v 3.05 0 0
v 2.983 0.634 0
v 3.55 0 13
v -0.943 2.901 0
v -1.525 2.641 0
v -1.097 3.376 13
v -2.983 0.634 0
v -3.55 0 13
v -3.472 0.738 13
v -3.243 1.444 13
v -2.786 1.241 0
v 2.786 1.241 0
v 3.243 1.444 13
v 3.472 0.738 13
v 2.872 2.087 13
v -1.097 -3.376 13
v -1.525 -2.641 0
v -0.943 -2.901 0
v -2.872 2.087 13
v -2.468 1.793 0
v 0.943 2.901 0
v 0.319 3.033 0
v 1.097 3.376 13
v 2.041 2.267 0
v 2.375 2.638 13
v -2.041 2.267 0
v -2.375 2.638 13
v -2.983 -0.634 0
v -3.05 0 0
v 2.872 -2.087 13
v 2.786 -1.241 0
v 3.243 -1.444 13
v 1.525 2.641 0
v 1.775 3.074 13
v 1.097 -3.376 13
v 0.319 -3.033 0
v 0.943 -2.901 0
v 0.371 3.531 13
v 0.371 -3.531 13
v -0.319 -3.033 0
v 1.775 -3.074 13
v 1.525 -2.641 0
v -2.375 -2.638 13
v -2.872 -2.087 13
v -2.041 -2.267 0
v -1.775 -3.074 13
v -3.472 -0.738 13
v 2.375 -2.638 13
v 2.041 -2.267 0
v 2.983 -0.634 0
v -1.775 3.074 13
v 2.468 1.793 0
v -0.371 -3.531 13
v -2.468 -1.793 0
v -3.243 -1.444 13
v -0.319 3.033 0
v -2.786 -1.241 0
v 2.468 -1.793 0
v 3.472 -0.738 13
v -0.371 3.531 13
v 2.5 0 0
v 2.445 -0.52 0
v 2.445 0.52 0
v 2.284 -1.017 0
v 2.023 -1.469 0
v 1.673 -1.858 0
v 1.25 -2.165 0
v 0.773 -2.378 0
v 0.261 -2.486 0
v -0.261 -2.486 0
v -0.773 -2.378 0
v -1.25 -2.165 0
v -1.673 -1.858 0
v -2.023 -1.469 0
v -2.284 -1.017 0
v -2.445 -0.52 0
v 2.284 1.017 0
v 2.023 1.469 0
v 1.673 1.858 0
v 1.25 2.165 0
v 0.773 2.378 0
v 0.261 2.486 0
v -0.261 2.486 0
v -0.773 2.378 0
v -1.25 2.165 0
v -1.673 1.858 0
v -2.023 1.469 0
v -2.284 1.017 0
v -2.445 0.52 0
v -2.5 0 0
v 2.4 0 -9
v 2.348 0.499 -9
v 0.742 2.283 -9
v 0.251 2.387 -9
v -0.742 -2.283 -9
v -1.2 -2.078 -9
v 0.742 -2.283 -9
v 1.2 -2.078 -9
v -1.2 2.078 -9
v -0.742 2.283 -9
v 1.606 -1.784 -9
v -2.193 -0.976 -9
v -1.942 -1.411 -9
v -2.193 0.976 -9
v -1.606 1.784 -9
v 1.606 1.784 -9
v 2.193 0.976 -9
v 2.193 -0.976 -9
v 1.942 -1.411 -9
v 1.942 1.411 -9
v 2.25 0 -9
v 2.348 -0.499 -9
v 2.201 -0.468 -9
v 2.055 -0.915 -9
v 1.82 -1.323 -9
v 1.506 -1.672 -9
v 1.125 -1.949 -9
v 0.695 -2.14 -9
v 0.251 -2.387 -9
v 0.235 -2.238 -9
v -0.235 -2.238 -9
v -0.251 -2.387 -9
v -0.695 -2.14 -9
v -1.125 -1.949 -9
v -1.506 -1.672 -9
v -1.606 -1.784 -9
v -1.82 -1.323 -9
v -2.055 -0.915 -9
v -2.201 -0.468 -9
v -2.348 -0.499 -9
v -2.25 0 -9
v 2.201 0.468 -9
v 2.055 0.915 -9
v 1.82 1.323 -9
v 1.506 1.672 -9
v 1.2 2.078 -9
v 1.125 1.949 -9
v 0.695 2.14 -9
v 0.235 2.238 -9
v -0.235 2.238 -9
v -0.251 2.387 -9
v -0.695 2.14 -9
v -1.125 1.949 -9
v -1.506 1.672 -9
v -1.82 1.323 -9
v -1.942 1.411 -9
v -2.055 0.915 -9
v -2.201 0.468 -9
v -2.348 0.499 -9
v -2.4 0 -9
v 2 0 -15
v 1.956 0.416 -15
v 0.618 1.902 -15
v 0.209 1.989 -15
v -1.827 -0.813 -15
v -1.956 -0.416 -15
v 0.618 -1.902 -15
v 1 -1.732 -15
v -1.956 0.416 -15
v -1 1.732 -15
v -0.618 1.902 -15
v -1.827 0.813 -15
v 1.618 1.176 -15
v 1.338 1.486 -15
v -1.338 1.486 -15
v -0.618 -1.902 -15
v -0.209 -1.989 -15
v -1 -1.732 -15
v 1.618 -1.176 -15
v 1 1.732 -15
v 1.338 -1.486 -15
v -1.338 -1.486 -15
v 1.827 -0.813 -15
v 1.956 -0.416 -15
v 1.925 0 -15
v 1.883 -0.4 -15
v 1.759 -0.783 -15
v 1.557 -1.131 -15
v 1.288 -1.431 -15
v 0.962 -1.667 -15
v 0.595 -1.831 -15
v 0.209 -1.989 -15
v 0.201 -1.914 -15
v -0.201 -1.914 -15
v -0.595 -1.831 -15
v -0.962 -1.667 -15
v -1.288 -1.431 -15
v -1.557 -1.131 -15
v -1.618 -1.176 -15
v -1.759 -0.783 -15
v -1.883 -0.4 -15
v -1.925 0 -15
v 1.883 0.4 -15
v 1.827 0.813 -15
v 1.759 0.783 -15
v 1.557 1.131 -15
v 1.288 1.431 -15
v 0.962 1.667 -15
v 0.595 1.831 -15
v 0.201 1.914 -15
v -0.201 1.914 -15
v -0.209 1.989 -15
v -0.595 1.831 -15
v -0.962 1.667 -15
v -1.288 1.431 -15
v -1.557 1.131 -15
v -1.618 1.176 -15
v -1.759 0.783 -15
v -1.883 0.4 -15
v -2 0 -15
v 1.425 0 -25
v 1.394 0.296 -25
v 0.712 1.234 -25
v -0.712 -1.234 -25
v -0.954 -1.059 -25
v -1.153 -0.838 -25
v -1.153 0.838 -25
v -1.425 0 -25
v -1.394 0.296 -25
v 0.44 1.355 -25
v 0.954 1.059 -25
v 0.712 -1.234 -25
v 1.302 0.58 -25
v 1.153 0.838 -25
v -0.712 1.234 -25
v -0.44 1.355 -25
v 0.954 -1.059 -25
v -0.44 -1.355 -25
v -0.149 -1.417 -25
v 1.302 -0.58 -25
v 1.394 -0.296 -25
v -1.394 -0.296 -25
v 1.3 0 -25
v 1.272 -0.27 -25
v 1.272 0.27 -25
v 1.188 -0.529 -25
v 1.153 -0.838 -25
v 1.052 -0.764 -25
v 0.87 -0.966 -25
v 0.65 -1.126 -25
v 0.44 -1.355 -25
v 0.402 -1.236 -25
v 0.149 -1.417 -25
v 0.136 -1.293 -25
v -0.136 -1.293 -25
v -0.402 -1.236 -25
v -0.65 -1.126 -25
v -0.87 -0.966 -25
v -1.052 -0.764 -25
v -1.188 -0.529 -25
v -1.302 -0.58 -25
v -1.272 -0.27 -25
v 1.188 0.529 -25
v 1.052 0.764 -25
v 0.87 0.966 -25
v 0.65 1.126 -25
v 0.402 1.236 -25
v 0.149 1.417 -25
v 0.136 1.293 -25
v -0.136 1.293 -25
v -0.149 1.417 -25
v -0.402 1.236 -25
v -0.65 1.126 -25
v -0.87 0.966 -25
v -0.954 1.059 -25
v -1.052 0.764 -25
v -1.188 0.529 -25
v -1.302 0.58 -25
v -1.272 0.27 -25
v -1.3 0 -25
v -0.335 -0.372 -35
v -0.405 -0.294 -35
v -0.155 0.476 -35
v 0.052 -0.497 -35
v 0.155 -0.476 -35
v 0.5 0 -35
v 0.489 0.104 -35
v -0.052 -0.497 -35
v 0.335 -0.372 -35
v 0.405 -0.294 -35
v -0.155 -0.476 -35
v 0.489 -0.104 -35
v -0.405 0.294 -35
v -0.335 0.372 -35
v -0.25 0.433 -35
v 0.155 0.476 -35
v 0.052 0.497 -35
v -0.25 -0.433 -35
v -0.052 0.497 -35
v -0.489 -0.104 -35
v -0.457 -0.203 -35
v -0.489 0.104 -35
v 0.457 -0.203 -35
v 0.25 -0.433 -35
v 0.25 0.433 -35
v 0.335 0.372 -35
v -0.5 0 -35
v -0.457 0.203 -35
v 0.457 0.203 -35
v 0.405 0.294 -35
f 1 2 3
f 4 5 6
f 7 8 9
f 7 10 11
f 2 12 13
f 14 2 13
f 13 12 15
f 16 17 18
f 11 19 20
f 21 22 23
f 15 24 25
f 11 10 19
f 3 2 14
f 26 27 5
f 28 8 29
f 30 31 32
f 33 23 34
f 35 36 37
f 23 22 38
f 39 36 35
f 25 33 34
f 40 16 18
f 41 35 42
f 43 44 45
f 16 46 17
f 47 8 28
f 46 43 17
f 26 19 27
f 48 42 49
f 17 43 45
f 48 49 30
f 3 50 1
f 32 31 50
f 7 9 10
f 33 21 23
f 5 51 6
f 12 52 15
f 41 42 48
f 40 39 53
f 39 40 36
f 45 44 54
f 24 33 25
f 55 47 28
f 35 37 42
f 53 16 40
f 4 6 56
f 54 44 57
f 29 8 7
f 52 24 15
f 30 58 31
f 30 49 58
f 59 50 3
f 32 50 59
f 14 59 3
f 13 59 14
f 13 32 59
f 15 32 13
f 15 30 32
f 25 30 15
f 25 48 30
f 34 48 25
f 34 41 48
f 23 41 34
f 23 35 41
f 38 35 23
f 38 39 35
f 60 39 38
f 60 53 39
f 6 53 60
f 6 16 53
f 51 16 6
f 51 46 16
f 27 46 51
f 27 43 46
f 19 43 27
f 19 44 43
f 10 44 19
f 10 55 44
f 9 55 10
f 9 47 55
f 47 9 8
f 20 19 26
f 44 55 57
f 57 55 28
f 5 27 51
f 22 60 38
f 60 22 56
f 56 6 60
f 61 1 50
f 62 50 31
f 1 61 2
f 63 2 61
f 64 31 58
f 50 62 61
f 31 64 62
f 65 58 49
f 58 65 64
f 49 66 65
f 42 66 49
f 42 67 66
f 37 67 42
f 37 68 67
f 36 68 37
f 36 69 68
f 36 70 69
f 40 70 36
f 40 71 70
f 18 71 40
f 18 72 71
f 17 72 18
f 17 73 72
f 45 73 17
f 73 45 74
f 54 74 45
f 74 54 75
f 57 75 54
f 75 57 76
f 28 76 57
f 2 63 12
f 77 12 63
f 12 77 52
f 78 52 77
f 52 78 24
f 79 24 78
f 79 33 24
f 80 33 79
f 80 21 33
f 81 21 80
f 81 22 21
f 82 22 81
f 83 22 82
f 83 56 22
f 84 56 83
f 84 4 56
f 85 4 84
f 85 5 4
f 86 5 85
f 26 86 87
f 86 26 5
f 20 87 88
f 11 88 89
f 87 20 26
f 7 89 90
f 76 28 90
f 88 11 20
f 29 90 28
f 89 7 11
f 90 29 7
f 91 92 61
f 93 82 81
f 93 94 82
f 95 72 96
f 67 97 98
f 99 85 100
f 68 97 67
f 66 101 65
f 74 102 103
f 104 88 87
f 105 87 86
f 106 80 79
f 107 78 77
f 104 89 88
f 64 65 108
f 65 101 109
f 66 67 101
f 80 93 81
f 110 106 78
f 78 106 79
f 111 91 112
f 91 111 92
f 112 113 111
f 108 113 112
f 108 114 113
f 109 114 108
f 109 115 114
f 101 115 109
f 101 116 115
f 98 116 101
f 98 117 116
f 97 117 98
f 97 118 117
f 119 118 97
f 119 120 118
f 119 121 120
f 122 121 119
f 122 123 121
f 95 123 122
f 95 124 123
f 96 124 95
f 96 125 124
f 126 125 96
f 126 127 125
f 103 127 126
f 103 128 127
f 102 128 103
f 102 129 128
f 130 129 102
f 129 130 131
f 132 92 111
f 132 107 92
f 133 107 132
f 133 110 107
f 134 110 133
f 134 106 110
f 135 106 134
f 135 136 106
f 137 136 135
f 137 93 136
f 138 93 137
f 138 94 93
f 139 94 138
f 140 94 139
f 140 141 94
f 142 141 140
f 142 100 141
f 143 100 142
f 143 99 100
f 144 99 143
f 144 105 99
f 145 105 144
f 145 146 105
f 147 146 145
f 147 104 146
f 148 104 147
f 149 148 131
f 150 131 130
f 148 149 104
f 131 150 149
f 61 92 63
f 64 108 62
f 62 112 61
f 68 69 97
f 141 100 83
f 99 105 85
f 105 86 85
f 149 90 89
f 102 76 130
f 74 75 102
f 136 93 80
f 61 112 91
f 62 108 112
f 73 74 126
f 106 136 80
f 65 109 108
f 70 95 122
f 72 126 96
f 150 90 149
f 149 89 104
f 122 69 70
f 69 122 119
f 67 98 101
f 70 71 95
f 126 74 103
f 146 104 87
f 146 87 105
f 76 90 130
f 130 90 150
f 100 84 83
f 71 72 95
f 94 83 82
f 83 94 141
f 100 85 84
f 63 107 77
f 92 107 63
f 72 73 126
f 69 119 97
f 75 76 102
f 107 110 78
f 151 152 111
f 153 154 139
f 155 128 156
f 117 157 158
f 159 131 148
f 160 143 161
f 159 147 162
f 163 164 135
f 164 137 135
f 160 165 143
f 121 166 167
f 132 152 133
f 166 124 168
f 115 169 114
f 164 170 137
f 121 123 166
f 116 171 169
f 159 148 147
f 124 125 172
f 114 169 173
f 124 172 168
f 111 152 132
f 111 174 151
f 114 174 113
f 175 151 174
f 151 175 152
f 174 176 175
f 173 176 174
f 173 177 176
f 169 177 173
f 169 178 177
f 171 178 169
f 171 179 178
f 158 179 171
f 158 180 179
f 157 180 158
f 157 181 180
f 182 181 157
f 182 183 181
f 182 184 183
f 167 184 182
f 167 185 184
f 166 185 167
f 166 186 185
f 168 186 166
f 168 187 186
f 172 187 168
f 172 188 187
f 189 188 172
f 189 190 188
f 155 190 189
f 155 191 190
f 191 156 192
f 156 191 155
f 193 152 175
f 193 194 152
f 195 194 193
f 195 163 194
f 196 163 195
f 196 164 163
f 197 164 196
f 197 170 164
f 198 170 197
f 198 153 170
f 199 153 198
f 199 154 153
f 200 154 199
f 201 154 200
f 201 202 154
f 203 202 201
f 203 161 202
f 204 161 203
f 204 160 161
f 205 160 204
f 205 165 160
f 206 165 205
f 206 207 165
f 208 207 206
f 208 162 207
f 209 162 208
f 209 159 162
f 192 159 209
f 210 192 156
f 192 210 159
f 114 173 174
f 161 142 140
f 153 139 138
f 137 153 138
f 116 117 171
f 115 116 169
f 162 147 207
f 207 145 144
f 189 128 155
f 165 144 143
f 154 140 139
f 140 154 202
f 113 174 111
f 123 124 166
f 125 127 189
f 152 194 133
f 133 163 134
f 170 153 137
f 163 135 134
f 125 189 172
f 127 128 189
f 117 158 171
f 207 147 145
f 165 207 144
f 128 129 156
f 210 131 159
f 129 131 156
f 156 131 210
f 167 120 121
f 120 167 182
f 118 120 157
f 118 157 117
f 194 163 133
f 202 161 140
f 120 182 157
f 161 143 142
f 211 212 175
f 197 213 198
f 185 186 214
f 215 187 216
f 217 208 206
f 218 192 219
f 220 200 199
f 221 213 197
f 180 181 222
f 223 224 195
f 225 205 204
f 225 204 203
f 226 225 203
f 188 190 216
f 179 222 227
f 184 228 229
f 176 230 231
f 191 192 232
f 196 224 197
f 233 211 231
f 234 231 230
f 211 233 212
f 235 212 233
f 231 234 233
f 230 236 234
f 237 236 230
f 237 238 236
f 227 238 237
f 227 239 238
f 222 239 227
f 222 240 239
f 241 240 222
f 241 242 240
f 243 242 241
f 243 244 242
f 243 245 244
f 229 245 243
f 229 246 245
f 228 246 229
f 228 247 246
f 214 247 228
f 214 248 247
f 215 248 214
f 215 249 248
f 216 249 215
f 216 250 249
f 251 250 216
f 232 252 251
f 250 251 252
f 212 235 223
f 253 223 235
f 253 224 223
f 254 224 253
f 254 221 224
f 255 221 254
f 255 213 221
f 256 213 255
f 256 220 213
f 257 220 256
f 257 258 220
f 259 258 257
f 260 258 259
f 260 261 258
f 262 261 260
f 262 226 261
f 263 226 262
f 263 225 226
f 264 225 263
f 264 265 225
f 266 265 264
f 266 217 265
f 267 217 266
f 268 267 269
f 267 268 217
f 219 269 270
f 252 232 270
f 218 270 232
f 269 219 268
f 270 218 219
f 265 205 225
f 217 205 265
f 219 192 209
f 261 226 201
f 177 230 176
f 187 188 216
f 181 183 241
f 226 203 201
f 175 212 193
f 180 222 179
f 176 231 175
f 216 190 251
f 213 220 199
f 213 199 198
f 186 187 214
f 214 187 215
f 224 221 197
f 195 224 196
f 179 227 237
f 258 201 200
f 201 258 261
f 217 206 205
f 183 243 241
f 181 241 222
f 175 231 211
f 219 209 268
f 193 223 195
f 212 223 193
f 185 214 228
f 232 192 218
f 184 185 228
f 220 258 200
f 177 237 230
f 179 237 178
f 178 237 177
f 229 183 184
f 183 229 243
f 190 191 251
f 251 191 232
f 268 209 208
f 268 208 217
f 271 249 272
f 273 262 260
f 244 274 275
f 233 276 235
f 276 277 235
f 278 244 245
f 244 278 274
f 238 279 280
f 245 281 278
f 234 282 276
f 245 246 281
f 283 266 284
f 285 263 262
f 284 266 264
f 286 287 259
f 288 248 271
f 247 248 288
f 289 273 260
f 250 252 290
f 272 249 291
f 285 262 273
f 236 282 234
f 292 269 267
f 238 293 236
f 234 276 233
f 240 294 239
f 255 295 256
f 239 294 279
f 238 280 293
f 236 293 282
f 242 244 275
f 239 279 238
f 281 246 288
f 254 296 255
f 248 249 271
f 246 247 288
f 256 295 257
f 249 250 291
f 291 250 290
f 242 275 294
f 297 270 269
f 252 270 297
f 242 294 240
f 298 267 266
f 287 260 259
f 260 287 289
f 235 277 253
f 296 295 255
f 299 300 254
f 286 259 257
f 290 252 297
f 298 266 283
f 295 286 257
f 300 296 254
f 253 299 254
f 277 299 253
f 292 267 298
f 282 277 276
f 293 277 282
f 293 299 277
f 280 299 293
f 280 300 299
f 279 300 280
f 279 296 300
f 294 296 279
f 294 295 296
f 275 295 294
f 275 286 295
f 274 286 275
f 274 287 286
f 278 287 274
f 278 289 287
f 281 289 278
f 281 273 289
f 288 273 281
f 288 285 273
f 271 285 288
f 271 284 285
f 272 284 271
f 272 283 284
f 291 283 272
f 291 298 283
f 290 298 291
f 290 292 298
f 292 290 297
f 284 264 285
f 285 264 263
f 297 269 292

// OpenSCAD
//include <../bayonet_tipcase_holder_modified.scad>
//include <../bayonet_holder_v3.scad>
//include <../bayonet_pipette_tipcase_holder_FINAL.scad>

//bayonet_pipette_tipcase_assy();
//translate([-1.5,10,-120+5-10])peek_nozzle_part1and2_4channel_p200LTS();
//peek_nozzle_part1and2_4channel_p200LTS_stub();

p200_lts_holder();

//bayonet_pipette_tipcase_holder_LTS();

module bayonet_pipette_tipcase_holder_LTS(){
difference(){
translate([328,437,184])rotate([0,0,-90])bayonet_pipette_tipcase_holder();
translate([-1.5,10,-120-3.1])scale([1,1,1])peek_nozzle_part1and2_4channel_p200LTS_stub();
for(x=[-1:1]){
for(y=[-1:1]){
translate([-1.5+x*(0.75),10+(y*0.75),-120-3])scale([1,1,1])peek_nozzle_part1and2_4channel_p200LTS_stub();
translate([-1.5+x*(0.75),10+(y*0.75),-120])scale([1,1,1])peek_nozzle_part1and2_4channel_p200LTS_stub();
}
}
}
}

//translate([328,437,184])rotate([0,0,-90])bayonet_pipette_tipcase_holder_v2();


module peek_nozzle_part1and2_4channel_p200LTS(){
translate([337-12.5,427,300])rotate([0,180,90])peek_nozzle_part1_4channel_p200LTS(); 
translate([337-12.5,427,300-15])rotate([0,180,90])peek_nozzle_part2_4channel_p200LTS(); //nozzle end
}

module peek_nozzle_part1and2_4channel_p200LTS_stub(){
translate([337-12.5,427,300])rotate([0,180,90])peek_nozzle_part1_4channel_p200LTS_stub(); 
translate([337-12.5,427,300-15])rotate([0,180,90])peek_nozzle_part2_4channel_p200LTS_stub(); //nozzle end
}



module peek_nozzle_part1_4channel_p200LTS_stub(){
difference(){
union(){
corner_radius = 1;  // Adjust this value to change roundness
translate([-4-2,-5-15.2,-2-15])rounded_cube([8+4, 10+15.1+5, 17+5-5], corner_radius);
}
#translate([0,0,-12.5]){
translate([0,3.5+4,-2])rotate([0,90,0])cylinder(d=1.7,h=40,$fn=50);
translate([0,-3.5-15,-2])rotate([0,-90,0])cylinder(d=1.7,h=40,$fn=50);
}
/*
for(i=[-1:2]){
translate([0,-i*7-1.5,-8])scale([1.05,1.05,1])rotate([0,180,0])p200_lts_holder();
}
*/

}
}






module peek_nozzle_part1_4channel_p200LTS(){
difference(){
union(){
corner_radius = 1;  // Adjust this value to change roundness
translate([-4-2,-5-15.2,-2-15])rounded_cube([8+4, 10+15.1+5, 17+5-5], corner_radius);
}
#translate([0,0,-12.5]){
translate([0,3.5+4,-2])rotate([0,90,0])cylinder(d=1.7,h=40,$fn=50);
translate([0,-3.5-15,-2])rotate([0,-90,0])cylinder(d=1.7,h=40,$fn=50);
}
for(i=[-1:2]){
translate([0,-i*7-1.5,-8])scale([1.05,1.05,1])rotate([0,180,0])p200_lts_holder();
}
}
}


module peek_nozzle_part2_4channel_p200LTS(){
difference(){
corner_radius = 1;  // Adjust this value to change roundness
union(){
translate([-4-2-2,-5-2-15,-2-17])rounded_cube([8+4+4, 10+4+15+5, 7.5+1], corner_radius);
hull(){for(i=[-1:2]){
translate([0,-i*7-1.5,-10.5])cylinder(d1=8,d2=5,h=3.3,$fn=50);
}
}
}
for(i=[-1:2]){
translate([0,-i*7-1.5,-23])scale([1.05,1.05,1])rotate([0,180,0])p200_lts_holder();
}
}
}

module peek_nozzle_part2_4channel_p200LTS_stub(){
difference(){
corner_radius = 1;  // Adjust this value to change roundness
union(){
translate([-4-2-2,-5-2-15,-2-17])rounded_cube([8+4+4, 10+4+15+5, 7.5+1], corner_radius);
hull(){for(i=[-1:2]){
translate([0,-i*7-1.5,-10.5])cylinder(d1=8,d2=5,h=3.3,$fn=50);
}
}
}
/*
for(i=[-1:2]){
translate([0,-i*7-1.5,-23])scale([1.05,1.05,1])rotate([0,180,0])p200_lts_holder();
}
*/
}
}









module rounded_cube(size, radius) {
$fn=50;
    hull() {
        translate([radius, radius, radius])
            sphere(r=radius);
        translate([size[0]-radius, radius, radius])
            sphere(r=radius);
        translate([radius, size[1]-radius, radius])
            sphere(r=radius);
        translate([size[0]-radius, size[1]-radius, radius])
            sphere(r=radius);
        translate([radius, radius, size[2]-radius])
            sphere(r=radius);
        translate([size[0]-radius, radius, size[2]-radius])
            sphere(r=radius);
        translate([radius, size[1]-radius, size[2]-radius])
            sphere(r=radius);
        translate([size[0]-radius, size[1]-radius, size[2]-radius])
            sphere(r=radius);
    }
}




module p200_lts_holder(){
color("pink")cylinder(d2=7.1,d1=6.1,h=13,$fn=30);
color("lime")translate([0,0,-9.])cylinder(d2=5,d1=4.8,h=9,$fn=30);
color("lightblue")translate([0,0,-9.-6.0])cylinder(d2=4.5,d1=4,h=6,$fn=30);
color("peru")translate([0,0,-9.-6.0-10])cylinder(d2=3.85,d1=2.85,h=10,$fn=30);
color("")translate([0,0,-9.-6.0-10-10])cylinder(d2=2.6,d1=1,h=10,$fn=30);
}


module bayonet_pipette_tipcase_assy(){
translate([400-70,426.5,330-3])rotate([0,0,-90]){
translate([0,0,-13]){
//bayonet pipette assay
bayonet_pipette_tipcase();
}
}
}

module bayonet_pipette_tipcase(){

translate([0-0.5,0-2,-130]){
//translate([-15-35,8,-9])rotate([0,90,0])tslot20(100);
//translate([-15-35,8-46,-9])rotate([0,90,0])tslot20(100);
//translate([14,0,0])bayonet_pipette_tipcase_holder();
translate([-10,0,0])bayonet_pipette_tipcase_holder();

}
}


module bayonet_pipette_tipcase_holder(){
difference(){
union(){
color("peru"){
translate([-17+10-1.5,13.5,-14])cube([10+3,18,10]);
translate([-17+5,13.5-3,-14])cube([23,10-0.5+3,13]);
translate([-17+5,13-36,-14])cube([23,10+3,13]);
translate([-17+10-1.5,13-36-8,-14])cube([10+3,18,10]);
translate([-17+5,13-36,-14])cube([5,10+36,13]);
translate([-17+3+20,13-36,-14])cube([5,10+36,13]);
}
}
corner_radius = 1;  // Adjust this value to change roundness
translate([-2,0,5])
translate([-4.25+10,-5-2-7.5+1,-2-11])rounded_cube([8+4, 10, 7.5+1], corner_radius);
translate([-4.25-10,-5-2+10,-2-6])rounded_cube([8+4, 10, 7.5+1], corner_radius);
/*
for(i=[-1:1]){
for(j=[-1:1]){
translate([-6.25+j/2,-5-2-7.5+2.7+i/2,-2-13])rounded_cube([12, 10+4+10, 7.5+10], corner_radius);
translate([-6.25+i/2,-5-2-7.5+2.7+j/2,-2-13])rounded_cube([12, 10+4+10, 7.5+10], corner_radius);
translate([-6.25+j/2,-5-2-7.5+i/2,-2-10])rounded_cube([8+4, 10+4+15, 7.5+10], corner_radius);
translate([-6.25+i/2,-5-2-7.5+j/2,-2-10])rounded_cube([8+4, 10+4+15, 7.5+10], corner_radius);
}
}
*/

translate([-2,23,-22])cylinder(d=5.2,h=42,$fn=100);
translate([-2,23,-11])cylinder(d=10.5,h=20,$fn=100);
translate([0,-46,0]){
translate([-2,23,-22])cylinder(d=5.2,h=42,$fn=100);
translate([-2,23,-11])cylinder(d=10.5,h=20,$fn=100);
}
}
}

//(C) Nathan Zadoks 2011
//CC-BY-SA or GPLv2, pick your poison.
module tslot(
	size=10,	//size of each side
	length=10,	//length. descriptive enough, no?
	thickness=3,	//thickness of the 'sheet'
	gap=0,		//gap, thickness of the lower part of the 'T'
	center=false,	//somewhat vague. todo.
	nut=false,	//set to true to make a fitting T-slot nut
){
	start=thickness/sqrt(2);
	if(nut){
		linear_extrude(height=10)
		intersection(){
			polygon([[size/2-gap/2,0],[size/2-gap/2,thickness],[thickness+start,thickness],[size/2,size/2-2],[size-thickness-start,thickness],[size/2+gap/2,thickness],[size/2+gap/2,0]]);
			square([size,size/2-(gap+thickness)/2]);
		}
	}	
	else{
		color([0.5,0.5,0.5])
		linear_extrude(height=length,center=center)
		translate([15,15])
		difference(){
			union(){
				for(d=[0:3]) rotate([0,0,d*90]) polygon(points=[
					[0,0],
					[0,start],[size/2-thickness-start,size/2-thickness],[gap/2,size/2-thickness],[gap/2,size/2],
					[size/2,size/2],[size/2,gap/2],[size/2-thickness,gap/2],[size/2-thickness,size/2-thickness-start],[start,0]
				]);
				square(gap+thickness,center=true);
			}
			circle(r=gap/2,center=true);
		}
	}
}
module tslot20(length,nut){
	tslot(size=20,gap=5.26,thickness=1.5,length=length,nut=nut);
}
